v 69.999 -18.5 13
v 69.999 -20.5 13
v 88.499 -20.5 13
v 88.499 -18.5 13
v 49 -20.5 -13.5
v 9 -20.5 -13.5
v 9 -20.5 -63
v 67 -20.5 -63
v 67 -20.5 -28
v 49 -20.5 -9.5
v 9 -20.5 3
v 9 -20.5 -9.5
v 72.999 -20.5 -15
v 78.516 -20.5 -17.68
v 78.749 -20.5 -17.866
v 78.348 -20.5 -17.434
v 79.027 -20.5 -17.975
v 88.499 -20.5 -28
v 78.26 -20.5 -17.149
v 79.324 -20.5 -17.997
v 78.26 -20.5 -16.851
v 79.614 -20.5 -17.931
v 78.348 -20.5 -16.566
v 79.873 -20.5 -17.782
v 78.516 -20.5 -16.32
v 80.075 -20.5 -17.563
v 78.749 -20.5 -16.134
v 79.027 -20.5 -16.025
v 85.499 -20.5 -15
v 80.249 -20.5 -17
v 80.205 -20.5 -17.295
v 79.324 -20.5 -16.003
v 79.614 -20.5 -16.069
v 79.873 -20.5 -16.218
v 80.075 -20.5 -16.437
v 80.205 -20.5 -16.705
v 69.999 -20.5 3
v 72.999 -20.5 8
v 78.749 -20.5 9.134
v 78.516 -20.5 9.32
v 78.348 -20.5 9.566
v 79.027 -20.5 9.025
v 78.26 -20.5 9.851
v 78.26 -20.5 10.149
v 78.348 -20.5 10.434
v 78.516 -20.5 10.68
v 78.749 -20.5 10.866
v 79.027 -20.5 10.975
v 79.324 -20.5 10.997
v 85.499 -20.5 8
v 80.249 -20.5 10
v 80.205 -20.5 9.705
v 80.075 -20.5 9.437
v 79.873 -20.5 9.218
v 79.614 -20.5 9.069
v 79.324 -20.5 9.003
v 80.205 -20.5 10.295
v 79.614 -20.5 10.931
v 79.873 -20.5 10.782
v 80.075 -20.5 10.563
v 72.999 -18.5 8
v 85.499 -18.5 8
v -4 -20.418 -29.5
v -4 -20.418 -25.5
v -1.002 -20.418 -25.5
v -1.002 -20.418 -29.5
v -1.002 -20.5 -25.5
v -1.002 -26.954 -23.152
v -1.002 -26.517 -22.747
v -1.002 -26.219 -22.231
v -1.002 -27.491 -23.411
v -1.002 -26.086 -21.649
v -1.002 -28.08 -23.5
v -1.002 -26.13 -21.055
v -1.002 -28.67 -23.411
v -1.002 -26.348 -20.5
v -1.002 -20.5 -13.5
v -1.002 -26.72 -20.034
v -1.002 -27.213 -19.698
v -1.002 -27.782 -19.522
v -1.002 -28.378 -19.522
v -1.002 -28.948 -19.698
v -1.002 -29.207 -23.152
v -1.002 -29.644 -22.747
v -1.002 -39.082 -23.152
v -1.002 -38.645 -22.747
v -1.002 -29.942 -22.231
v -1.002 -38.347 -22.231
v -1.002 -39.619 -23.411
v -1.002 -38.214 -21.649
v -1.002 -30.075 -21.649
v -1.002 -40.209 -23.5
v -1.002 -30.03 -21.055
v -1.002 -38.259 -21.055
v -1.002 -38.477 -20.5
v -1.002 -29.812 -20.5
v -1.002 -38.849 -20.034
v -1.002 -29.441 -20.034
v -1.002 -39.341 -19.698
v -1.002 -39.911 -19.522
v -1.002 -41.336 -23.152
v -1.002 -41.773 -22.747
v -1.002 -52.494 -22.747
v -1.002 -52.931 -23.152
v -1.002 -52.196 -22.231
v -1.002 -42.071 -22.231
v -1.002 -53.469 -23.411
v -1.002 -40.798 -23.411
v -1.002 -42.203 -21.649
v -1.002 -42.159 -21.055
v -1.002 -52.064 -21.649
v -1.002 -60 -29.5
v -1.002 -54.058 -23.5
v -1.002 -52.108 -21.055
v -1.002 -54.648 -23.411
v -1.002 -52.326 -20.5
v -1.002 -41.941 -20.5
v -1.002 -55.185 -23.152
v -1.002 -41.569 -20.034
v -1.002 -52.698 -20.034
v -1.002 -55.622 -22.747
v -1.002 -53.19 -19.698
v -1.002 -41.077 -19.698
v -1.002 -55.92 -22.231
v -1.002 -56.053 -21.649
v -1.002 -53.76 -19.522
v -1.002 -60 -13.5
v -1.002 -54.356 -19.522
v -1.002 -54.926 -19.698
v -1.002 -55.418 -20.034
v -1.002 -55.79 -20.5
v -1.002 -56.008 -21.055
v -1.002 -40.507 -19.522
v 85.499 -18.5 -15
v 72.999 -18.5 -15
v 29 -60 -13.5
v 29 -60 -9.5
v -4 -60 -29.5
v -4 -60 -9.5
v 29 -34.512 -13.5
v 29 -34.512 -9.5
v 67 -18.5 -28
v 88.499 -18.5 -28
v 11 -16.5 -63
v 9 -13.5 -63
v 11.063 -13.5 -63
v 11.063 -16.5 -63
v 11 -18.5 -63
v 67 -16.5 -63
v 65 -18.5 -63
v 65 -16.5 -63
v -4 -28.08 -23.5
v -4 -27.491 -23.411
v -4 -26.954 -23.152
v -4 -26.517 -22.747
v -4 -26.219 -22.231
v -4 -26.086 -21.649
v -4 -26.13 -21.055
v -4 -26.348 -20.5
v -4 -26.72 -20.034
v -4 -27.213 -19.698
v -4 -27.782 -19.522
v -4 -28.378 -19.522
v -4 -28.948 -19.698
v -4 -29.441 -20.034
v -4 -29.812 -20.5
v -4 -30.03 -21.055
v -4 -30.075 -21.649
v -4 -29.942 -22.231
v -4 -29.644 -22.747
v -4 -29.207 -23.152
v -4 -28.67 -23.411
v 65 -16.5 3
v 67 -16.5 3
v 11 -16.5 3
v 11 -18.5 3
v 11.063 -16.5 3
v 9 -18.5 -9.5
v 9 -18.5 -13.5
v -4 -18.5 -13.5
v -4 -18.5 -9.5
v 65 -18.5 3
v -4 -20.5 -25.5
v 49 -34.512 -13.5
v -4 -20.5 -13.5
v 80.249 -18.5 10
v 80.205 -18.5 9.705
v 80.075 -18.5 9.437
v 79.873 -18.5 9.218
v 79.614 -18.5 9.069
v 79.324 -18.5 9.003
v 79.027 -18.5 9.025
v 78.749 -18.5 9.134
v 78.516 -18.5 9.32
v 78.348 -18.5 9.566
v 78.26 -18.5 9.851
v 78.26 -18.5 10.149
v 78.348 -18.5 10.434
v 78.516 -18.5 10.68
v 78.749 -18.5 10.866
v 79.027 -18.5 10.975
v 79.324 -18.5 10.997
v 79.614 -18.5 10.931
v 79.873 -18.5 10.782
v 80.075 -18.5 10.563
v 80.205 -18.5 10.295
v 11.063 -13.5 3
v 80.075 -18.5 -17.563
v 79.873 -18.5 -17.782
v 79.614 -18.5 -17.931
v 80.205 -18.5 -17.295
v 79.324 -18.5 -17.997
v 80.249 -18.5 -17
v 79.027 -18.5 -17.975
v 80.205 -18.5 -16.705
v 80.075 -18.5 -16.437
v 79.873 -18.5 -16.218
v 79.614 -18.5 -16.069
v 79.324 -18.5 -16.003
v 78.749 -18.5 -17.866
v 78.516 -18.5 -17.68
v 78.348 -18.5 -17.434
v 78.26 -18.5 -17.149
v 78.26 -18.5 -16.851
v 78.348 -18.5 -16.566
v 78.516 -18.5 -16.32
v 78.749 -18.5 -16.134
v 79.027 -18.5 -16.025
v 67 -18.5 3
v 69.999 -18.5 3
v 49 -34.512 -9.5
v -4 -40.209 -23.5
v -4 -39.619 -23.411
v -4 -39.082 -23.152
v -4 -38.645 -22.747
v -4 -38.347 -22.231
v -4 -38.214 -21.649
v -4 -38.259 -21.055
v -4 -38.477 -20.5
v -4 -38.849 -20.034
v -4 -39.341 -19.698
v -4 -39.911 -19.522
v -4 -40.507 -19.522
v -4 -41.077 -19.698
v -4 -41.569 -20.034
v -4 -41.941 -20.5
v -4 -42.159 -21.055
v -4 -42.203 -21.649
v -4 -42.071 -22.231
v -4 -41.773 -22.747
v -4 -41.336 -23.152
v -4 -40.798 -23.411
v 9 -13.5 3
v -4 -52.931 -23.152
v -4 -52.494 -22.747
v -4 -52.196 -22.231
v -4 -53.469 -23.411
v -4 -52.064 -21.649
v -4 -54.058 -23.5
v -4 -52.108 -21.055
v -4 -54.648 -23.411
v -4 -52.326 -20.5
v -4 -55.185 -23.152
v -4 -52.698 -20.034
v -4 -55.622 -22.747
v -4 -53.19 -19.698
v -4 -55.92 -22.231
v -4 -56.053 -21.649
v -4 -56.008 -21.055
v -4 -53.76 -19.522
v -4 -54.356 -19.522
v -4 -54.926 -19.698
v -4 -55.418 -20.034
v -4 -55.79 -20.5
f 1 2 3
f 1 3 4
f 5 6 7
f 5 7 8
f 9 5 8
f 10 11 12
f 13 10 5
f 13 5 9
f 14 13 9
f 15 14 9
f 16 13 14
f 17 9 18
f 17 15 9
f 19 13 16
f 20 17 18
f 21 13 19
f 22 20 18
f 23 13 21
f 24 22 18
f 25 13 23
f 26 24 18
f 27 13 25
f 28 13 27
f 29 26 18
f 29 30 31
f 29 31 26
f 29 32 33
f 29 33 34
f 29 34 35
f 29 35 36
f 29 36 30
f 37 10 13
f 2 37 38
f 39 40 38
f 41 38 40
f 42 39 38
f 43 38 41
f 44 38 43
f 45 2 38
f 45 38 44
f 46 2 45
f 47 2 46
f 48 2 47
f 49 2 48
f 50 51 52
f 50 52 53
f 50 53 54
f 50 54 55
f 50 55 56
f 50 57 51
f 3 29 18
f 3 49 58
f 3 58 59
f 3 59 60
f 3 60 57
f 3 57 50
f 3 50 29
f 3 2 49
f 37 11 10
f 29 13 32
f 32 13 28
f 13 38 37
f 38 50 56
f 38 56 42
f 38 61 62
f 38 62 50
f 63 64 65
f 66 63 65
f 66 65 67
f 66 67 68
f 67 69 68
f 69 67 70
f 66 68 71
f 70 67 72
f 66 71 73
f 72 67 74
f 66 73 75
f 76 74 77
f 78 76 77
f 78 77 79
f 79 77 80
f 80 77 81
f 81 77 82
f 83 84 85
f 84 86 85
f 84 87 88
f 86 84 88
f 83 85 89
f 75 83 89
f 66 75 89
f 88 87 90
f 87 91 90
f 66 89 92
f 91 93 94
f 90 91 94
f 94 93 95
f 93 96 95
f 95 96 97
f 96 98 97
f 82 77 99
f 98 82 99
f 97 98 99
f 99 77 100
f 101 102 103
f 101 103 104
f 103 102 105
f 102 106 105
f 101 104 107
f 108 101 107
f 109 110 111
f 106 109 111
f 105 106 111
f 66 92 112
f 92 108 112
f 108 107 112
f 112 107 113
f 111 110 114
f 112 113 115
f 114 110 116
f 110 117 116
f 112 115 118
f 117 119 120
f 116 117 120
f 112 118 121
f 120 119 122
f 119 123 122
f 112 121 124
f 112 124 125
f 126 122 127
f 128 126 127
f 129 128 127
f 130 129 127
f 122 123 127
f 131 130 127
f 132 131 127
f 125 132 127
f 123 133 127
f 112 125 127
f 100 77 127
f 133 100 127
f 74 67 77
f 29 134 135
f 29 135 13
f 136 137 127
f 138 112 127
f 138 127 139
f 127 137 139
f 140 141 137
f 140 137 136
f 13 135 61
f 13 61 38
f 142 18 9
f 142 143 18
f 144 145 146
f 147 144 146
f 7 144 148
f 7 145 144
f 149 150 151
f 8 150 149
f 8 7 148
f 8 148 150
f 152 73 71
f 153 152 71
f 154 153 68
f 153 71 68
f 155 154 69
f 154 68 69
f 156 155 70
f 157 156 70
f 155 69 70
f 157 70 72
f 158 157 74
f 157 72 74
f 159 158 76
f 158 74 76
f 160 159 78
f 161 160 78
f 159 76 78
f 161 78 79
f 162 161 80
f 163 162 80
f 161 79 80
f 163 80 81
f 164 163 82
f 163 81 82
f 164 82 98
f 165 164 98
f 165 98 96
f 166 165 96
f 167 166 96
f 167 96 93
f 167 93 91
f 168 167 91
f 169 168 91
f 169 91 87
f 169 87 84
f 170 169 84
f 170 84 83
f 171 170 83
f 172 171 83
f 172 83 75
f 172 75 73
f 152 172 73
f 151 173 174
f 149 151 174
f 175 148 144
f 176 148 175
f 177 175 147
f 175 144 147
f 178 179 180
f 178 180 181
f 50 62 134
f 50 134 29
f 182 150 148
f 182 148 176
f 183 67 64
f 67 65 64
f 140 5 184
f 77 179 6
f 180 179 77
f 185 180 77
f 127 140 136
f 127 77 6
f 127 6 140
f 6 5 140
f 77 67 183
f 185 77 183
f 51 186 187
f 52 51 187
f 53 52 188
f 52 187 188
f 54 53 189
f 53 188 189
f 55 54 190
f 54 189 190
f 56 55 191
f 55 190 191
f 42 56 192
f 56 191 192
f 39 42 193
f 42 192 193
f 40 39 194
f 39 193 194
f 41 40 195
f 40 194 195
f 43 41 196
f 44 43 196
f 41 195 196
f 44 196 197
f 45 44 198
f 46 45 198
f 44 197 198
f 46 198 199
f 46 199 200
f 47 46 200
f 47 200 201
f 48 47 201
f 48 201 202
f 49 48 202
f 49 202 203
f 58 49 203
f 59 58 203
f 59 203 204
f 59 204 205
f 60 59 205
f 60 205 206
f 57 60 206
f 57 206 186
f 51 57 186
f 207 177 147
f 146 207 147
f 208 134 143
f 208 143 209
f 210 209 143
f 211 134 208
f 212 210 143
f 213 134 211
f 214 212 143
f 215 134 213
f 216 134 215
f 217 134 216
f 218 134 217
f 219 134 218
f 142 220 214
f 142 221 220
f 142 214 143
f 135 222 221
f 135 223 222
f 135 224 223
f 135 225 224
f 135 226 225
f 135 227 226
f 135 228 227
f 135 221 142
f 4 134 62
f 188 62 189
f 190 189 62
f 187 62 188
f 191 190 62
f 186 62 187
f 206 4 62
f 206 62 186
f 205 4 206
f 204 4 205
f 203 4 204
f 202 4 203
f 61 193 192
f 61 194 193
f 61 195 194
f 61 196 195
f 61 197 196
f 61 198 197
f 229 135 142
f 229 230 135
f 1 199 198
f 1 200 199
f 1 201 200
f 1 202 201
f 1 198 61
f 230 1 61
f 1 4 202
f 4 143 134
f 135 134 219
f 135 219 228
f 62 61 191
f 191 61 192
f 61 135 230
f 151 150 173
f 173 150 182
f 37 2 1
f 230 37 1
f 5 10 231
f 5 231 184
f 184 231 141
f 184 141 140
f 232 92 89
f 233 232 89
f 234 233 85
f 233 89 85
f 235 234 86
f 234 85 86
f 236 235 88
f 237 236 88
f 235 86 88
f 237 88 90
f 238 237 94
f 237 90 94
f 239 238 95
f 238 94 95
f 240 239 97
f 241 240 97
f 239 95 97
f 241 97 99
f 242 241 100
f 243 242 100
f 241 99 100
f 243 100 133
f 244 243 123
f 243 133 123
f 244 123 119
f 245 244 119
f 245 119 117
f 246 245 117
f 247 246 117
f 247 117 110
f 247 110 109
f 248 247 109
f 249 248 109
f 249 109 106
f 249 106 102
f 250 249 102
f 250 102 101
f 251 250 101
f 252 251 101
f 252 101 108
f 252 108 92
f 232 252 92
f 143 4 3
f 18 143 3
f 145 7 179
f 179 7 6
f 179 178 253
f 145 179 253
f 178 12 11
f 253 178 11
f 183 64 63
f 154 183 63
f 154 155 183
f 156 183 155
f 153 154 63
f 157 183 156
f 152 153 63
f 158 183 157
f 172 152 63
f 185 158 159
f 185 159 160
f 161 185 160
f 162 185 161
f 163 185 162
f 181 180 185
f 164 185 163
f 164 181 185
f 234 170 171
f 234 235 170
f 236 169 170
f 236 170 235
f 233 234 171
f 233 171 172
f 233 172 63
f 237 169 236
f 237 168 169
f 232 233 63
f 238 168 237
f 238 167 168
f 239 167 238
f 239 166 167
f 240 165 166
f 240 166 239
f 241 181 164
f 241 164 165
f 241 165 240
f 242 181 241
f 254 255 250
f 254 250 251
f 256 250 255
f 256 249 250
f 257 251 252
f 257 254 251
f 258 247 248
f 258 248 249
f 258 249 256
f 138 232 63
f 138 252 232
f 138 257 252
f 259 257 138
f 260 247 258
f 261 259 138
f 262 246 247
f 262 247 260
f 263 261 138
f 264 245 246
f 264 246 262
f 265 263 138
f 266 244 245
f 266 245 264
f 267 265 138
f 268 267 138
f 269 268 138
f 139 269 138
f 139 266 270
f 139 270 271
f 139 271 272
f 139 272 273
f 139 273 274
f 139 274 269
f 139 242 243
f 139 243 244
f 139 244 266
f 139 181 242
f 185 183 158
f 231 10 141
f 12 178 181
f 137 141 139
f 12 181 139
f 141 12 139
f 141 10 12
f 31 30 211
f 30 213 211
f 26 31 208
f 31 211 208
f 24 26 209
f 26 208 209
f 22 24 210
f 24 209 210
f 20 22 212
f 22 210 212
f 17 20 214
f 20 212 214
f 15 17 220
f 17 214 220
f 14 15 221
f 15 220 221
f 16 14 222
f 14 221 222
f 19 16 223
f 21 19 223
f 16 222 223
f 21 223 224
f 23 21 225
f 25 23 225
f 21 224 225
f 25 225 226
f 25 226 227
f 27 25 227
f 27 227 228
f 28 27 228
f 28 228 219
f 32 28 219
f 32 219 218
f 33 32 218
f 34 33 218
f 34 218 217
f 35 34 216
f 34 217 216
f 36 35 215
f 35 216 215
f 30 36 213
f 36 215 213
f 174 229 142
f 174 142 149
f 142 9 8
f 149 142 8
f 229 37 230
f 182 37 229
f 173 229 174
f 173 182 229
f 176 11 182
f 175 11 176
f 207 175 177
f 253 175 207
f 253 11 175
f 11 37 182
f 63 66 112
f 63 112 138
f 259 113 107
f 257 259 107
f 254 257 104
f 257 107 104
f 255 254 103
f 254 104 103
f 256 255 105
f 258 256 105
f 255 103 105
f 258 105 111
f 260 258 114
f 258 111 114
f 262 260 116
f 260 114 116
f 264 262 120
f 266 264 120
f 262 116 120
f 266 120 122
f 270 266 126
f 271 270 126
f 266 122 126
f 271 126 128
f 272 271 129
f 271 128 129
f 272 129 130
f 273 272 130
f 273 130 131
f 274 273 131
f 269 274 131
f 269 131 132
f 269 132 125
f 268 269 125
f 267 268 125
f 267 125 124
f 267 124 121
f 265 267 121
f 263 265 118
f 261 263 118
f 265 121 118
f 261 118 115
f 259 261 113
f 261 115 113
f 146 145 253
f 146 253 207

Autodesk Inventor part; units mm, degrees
ref_plane "YZ Plane" through (0, 0, 0) normal (1, 0, 0) x (0, 1, 0)
ref_plane "XZ Plane" through (0, 0, 0) normal (0, 1, 0) x (-1, 0, 0)
ref_plane "XY Plane" through (0, 0, 0) normal (0, 0, 1) x (1, 0, 0)
sketch "Sketch1" plane through (0, 0, 0) normal (1, 0, 0) x (0, 1, 0)
  line L0 (0, 0) -> (20.5296, 0)
  line L1 (20.5296, -23) -> (0, -23)
  line L2 (0, -23) -> (0, 0)
  line L3 (0, 0) -> (50, 0)
  line L4 (50, 0) -> (50, -23)
  line L5 (50, -23) -> (0, -23)
  line L6 (0, -23) -> (0, 0)
  dimension "d0" = 23
  dimension "d1" = 50
extrude "Extrusion1" add sketch "Sketch1" along normal blind 2
sketch "Sketch2" plane through (2, 0, 0) normal (1, 0, 0) x (0, 0, -1)
  line L0 (23, 50) -> (0, 50) projected
  line L1 (13.5, 0) -> (9.5, 0)
  line L2 (9.5, 0) -> (9.5, 50)
  line L3 (9.5, 50) -> (13.5, 50)
  line L4 (13.5, 50) -> (13.5, 0)
  line L5 (13.5, 0) -> (9.5, 50) construction
  line L6 (9.5, 0) -> (13.5, 50) construction
  point P0 (0, 0)
  point P1 (17.2504, 25)
  point P2 (11.5, 25)
  dimension "d4" = 4
sketch "Sketch3" plane through (0, 0, 0) normal (-1, 0, 0) x (0, 0, 1)
  line L0 (-23, 50) -> (0, 50) projected
  line L1 (-23, 50) -> (0, 50)
  line L2 (0, 50) -> (0, 0)
  line L3 (0, 0) -> (-23, 0)
  line L4 (-23, 0) -> (-23, 50)
extrude "Extrusion2" add sketch "Sketch3" along normal blind 1
sketch "Sketch4" plane through (2, 0, 0) normal (1, 0, 0) x (0, 0, -1)
  point P0 (0, 0)
extrude "Extrusion3" add sketch "Sketch2" along normal blind 29
sketch "Sketch5" plane through (2, 0, -9.5) normal (0, 0, 1) x (1, 0, 0)
  line L0 (0, 50) -> (29, 50) projected
  line L1 (29, 0) -> (27, 0)
  line L2 (27, 0) -> (27, 50)
  line L3 (27, 50) -> (29, 50)
  line L4 (29, 50) -> (29, 0)
  point P0 (-2, 0)
  dimension "d9" = 2
extrude "Extrusion4" add sketch "Sketch5" along normal blind 17.5
sketch "Sketch6" plane through (2, 0, -13.5) normal (0, 0, -1) x (-1, 0, 0)
  line L0 (-29, 50) -> (-27, 50) projected
  line L1 (-27, 50) -> (-27, 0) projected
  line L2 (-29, 50) -> (-27, 50)
  line L3 (-27, 50) -> (-27, 0)
  line L4 (-27, 0) -> (-29, 0)
  line L5 (-29, 0) -> (-29, 50)
  point P0 (2, 0)
extrude "Extrusion5" add sketch "Sketch6" along normal blind 17.5
sketch "Sketch7" plane through (31, 0, 0) normal (1, 0, 0) x (0, 0, -1)
  line L0 (-8, 0) -> (-8, 50) projected
  line L1 (31, 50) -> (31, 0) projected
  line L2 (-8, 50) -> (31, 50)
  line L3 (31, 50) -> (31, 48)
  line L4 (31, 48) -> (-8, 48)
  line L5 (-8, 48) -> (-8, 50)
  point P0 (0, 0)
  dimension "d14" = 2
extrude "Extrusion6" add sketch "Sketch7" along normal blind 32
sketch "Sketch8" plane through (31, 48, -31) normal (0, -1, 0) x (1, 0, 0)
  line L0 (32, 39) -> (32, 0) projected
  line L1 (0, 0) -> (32, 0) projected
  line L2 (32, 39) -> (30, 39)
  line L3 (30, 39) -> (30, 0)
  line L4 (30, 0) -> (32, 0)
  line L5 (32, 0) -> (32, 39)
  point P0 (-31, 31)
  dimension "d17" = 2
extrude "Extrusion7" add sketch "Sketch8" along normal up to surface (48 mm away)
sketch "Sketch9" plane through (31, 48, -31) normal (0, -1, 0) x (1, 0, 0)
  point P0 (-31, 31)
sketch "Sketch10" plane through (61, 0, 8) normal (0, -1, 0) x (1, 0, 0)
  line L0 (2, -39) -> (2, 0) projected
  line L1 (-32, -17.5) -> (-32, 0) projected
  line L2 (2, 0) -> (-32, 0)
  line L3 (-32, 0) -> (-32, -9)
  line L4 (-32, -9) -> (2, -9)
  line L5 (2, -9) -> (2, 0)
  point P0 (-61, -8)
  dimension "d20" = 9
extrude "Extrusion8" cut sketch "Sketch10" against normal blind 50
sketch "Sketch11" plane through (2, 0, -31) normal (0, 0, -1) x (-1, 0, 0)
  line L0 (-61, 50) -> (-61, 0) projected
  line L1 (0, 50) -> (-27, 50) projected
  line L2 (-61, 0) -> (-27, 0)
  line L3 (-27, 0) -> (-27, 50)
  line L4 (-27, 50) -> (-61, 50)
  line L5 (-61, 50) -> (-61, 0)
  point P0 (2, 0)
extrude "Extrusion9" add sketch "Sketch11" along normal blind 2
sketch "Sketch12" plane through (-1, 0, 0) normal (0, -1, 0) x (1, 0, 0)
  line L0 (62, -1) -> (32, -1) projected
  line L1 (64, -1) -> (64, -33) projected
  line L2 (62, -1) -> (64, -1)
  line L3 (64, -1) -> (64, -31.0308)
  line L4 (64, -31.0308) -> (62, -31.0308)
  line L5 (62, -31.0308) -> (62, -1)
  point P0 (1, 0)
extrude "Extrusion10" add sketch "Sketch12" along normal blind 20.5
sketch "Sketch13" plane through (61, 48, -31) normal (-1, 0, 0) x (0, 0, 1)
  line L0 (30, -68.5) -> (-0.0308, -68.5) projected
  line L1 (30, 0) -> (30, -68.5) projected
  line L2 (-0.0308, -68.5) -> (30, -68.5)
  line L3 (30, -68.5) -> (30, -66.5)
  line L4 (30, -66.5) -> (-0.0308, -66.5)
  line L5 (-0.0308, -66.5) -> (-0.0308, -68.5)
  point P0 (31, -48)
  dimension "d27" = 2
extrude "Extrusion11" add sketch "Sketch13" along normal up to surface (32 mm away)
sketch "Sketch14" plane through (-1, 0, 0) normal (0, -1, 0) x (1, 0, 0)
  line L0 (64, -33) -> (30, -33) projected
  line L1 (64, -31.0308) -> (30, -31.0308) projected
  line L2 (64, -33) -> (30, -33)
  line L3 (30, -33) -> (30, -31.0308)
  line L4 (30, -31.0308) -> (64, -31.0308)
  line L5 (64, -31.0308) -> (64, -33)
  point P0 (1, 0)
  point P1 (30, -33)
extrude "Extrusion12" add sketch "Sketch14" along normal up to surface (20.5 mm away)
sketch "Sketch15" plane through (61, 48, -31) normal (-1, 0, 0) x (0, 0, 1)
  line L0 (-0.0308, -66.5) -> (30, -66.5) projected
  line L1 (30, 0) -> (30, -66.5) projected
  line L2 (-0.0308, -66.5) -> (30, -66.5)
  line L3 (30, -66.5) -> (30, -48)
  line L4 (30, -48) -> (-0.0308, -48)
  line L5 (-0.0308, -48) -> (-0.0308, -66.5)
  point P0 (31, -48)
extrude "Extrusion13" cut sketch "Sketch15" against normal blind 10
sketch "Sketch16" plane through (-1, 0, 0) normal (0, -1, 0) x (1, 0, 0)
  line L0 (32, -31) -> (32, -1) projected
  line L1 (30, -33) -> (64, -33) projected
  line L2 (32, -1) -> (30, -1)
  line L3 (30, -1) -> (30, -33)
  line L4 (30, -33) -> (32, -33)
  line L5 (32, -33) -> (32, -1)
  point P0 (1, 0)
extrude "Extrusion14" add sketch "Sketch16" along normal up to surface (18.5 mm away)
sketch "Sketch17" plane through (31, 0, -31.0308) normal (0, 0, 1) x (1, 0, 0)
  line L0 (0, 48) -> (0, -18.5) projected
  line L1 (32, 50) -> (32, -20.5) projected
  line L2 (0, -18.5) -> (32, -18.5)
  line L3 (32, -18.5) -> (32, 0)
  line L4 (32, 0) -> (0, 0)
  line L5 (0, 0) -> (0, -18.5)
  point P0 (-31, 0)
extrude "Extrusion15" cut sketch "Sketch17" against normal blind 10
sketch "Sketch18" plane through (31, 0, 0) normal (1, 0, 0) x (0, 0, -1)
  line L0 (1, 48) -> (1, -18.5) projected
  line L1 (31, 0) -> (1, 0) projected
  line L2 (1, -18.5) -> (3, -18.5)
  line L3 (3, -18.5) -> (3, 0)
  line L4 (3, 0) -> (1, 0)
  line L5 (1, 0) -> (1, -18.5)
  point P0 (0, 0)
  dimension "d38" = 2
extrude "Extrusion16" add sketch "Sketch18" along normal blind 13
sketch "Sketch19" plane through (29, 50, -1) normal (0, 0, 1) x (1, 0, 0)
  line L0 (34, -68.5) -> (34, -70.5) projected
  line L1 (34, -70.5) -> (0, -70.5) projected
  line L2 (34, -68.5) -> (0, -68.5)
  line L3 (0, -68.5) -> (0, -70.5)
  line L4 (0, -70.5) -> (34, -70.5)
  line L5 (34, -70.5) -> (34, -68.5)
  point P0 (-29, -50)
extrude "Extrusion17" add sketch "Sketch19" along normal blind 2
sketch "Sketch20" plane through (31, -18.5, -33) normal (0, 1, 0) x (1, 0, 0)
  point P0 (-31, -33)
sketch "Sketch21" plane through (29, 50, -1) normal (0, 0, 1) x (1, 0, 0)
  line L0 (15, -50) -> (15, -68.5) projected
  line L1 (2, -68.5) -> (15, -68.5) projected
  line L2 (15, -50) -> (2, -50)
  line L3 (2, -50) -> (2, -68.5)
  line L4 (2, -68.5) -> (15, -68.5)
  line L5 (15, -68.5) -> (15, -50)
  point P0 (-29, -50)
extrude "Extrusion18" cut sketch "Sketch21" against normal blind 2
sketch "Sketch22" plane through (31, -18.5, -33) normal (0, 1, 0) x (1, 0, 0)
  line L0 (32, -34) -> (-2, -34) projected
  line L1 (30, -32) -> (0, -32) projected
  line L2 (-2, -34) -> (13, -34)
  line L3 (13, -34) -> (13, -32)
  line L4 (13, -32) -> (-2, -32)
  line L5 (-2, -32) -> (-2, -34)
  point P0 (-31, -33)
  dimension "d45" = 15
extrude "Extrusion19" add sketch "Sketch22" along normal blind 4
sketch "Sketch23" plane through (29, 50, 1) normal (0, 0, 1) x (1, 0, 0)
  point P0 (-29, -50)
sketch "Sketch24" plane through (63, 0, 0) normal (1, 0, 0) x (0, 0, -1)
  point P0 (0, 0)
sketch "Sketch25" plane through (63, 0, 0) normal (1, 0, 0) x (0, 0, -1)
  line L0 (-1, -20.5) -> (-1, -18.5) projected
  line L1 (33, -20.5) -> (-1, -20.5) projected
  line L2 (-1, -18.5) -> (33, -18.5)
  line L3 (33, -18.5) -> (33, -20.5)
  line L4 (33, -20.5) -> (-1, -20.5)
  line L5 (-1, -20.5) -> (-1, -18.5)
  point P0 (0, 0)
extrude "Extrusion20" add sketch "Sketch25" along normal blind 5
sketch "Sketch26" plane through (68, 0, 0) normal (1, 0, 0) x (0, 0, -1)
  line L0 (1, -18.5) -> (33, -18.5) projected
  line L1 (33, -20.5) -> (-1, -20.5) projected
  line L2 (2.0812, -18.5) -> (-1, -18.5)
  line L3 (-1, -18.5) -> (-1, -20.5)
  line L4 (-1, -20.5) -> (2.0812, -20.5)
  line L5 (2.0812, -20.5) -> (2.0812, -18.5)
  point P0 (0, 0)
extrude "Extrusion21" add sketch "Sketch26" along normal blind 14
sketch "Sketch27" plane through (68, -20.5, -2.0812) normal (0, 0, -1) x (-1, 0, 0)
  line L0 (-14, 2) -> (-14, 0) projected
  line L1 (39, 0) -> (-14, 0) projected
  line L2 (-14, 2) -> (-12, 2)
  line L3 (-12, 2) -> (-12, 0)
  line L4 (-12, 0) -> (-14, 0)
  line L5 (-14, 0) -> (-14, 2)
  point P0 (68, 20.5)
  dimension "d52" = 2
extrude "Extrusion22" add sketch "Sketch27" along normal blind 25
sketch "Sketch28" plane through (80, -20.5, -2.0812) normal (-1, 0, 0) x (0, 0, 1)
  point P0 (2.0812, 20.5)
sketch "Sketch29" plane through (80, -20.5, -2.0812) normal (-1, 0, 0) x (0, 0, 1)
  line L0 (-25, 2) -> (-25, 0) projected
  line L1 (3.0812, 0) -> (-25, 0) projected
  line L2 (-25, 2) -> (-23, 2)
  line L3 (-23, 2) -> (-23, 0)
  line L4 (-23, 0) -> (-25, 0)
  line L5 (-25, 0) -> (-25, 2)
  point P0 (2.0812, 20.5)
  dimension "d55" = 2
extrude "Extrusion23" add sketch "Sketch29" along normal up to surface (12 mm away)
sketch "Sketch30" plane through (68, -20.5, -27.0812) normal (0, 0, -1) x (-1, 0, 0)
  line L0 (-14, 2) -> (-14, 0) projected
  line L1 (0, 0) -> (-12, 0) projected
  line L2 (-14, 2) -> (0, 2)
  line L3 (0, 2) -> (0, 0)
  line L4 (0, 0) -> (-14, 0)
  line L5 (-14, 0) -> (-14, 2)
  point P0 (68, 20.5)
extrude "Extrusion24" add sketch "Sketch30" along normal up to surface (5.9188 mm away)
sketch "Sketch31" plane through (31, -18.5, -1) normal (0, 1, 0) x (1, 0, 0)
  line L0 (37, 1.0812) -> (49, 1.0812) projected
  line L1 (43, 1.0812) -> (43, 0.2954)
  point P0 (-31, -1)
sketch "Sketch32" plane through (29, 50, 1) normal (0, 0, 1) x (1, 0, 0)
  line L0 (53, -68.5) -> (53, -70.5) projected
  line L1 (15, -68.5) -> (53, -68.5) projected
  line L2 (53, -70.5) -> (15, -70.5)
  line L3 (15, -70.5) -> (15, -68.5)
  line L4 (15, -68.5) -> (53, -68.5)
  line L5 (53, -68.5) -> (53, -70.5)
  point P0 (-29, -50)
extrude "Extrusion25" add sketch "Sketch32" along normal blind 2
sketch "Sketch33" plane through (31, -18.5, -1) normal (0, 1, 0) x (1, 0, 0)
  line L0 (37, 1.0812) -> (49, 1.0812) projected
  circle A0 centre (43, -0.9188) radius 1
  line L1 (49, 24.0812) -> (37, 24.0812) projected
  circle A1 centre (43, 26.0812) radius 1
  point P0 (-31, -1)
  dimension "d63" = 2
extrude "Extrusion26" cut sketch "Sketch33" against normal blind 5
thread "Thread1" size "M2x0.4" class "6H" standard "ANSI Metric M Profile" full length
thread "Thread2" size "M2x0.4" class "6H" standard "ANSI Metric M Profile" full length
sketch "Sketch34" plane through (2, 0, -33) normal (0, 0, -1) x (-1, 0, 0)
  line L0 (-27, 50) -> (-27, -20.5) projected
  line L1 (-80, -18.5) -> (-42, -18.5) projected
  line L2 (-27, -20.5) -> (-61, -20.5)
  line L3 (-61, -20.5) -> (-61, -18.5)
  line L4 (-61, -18.5) -> (-27, -18.5)
  line L5 (-27, -18.5) -> (-27, -20.5)
  point P0 (2, 0)
  point P1 (-42, -18.5)
extrude "Extrusion27" add sketch "Sketch34" along normal blind 30
sketch "Sketch35" plane through (31, -18.5, -1) normal (0, 1, 0) x (1, 0, 0)
  line L0 (0, 0) -> (0, 32) projected
  line L1 (-2, 62) -> (-2, -2) projected
  line L2 (0, 32) -> (-2, 32)
  line L3 (-2, 32) -> (-2, 62)
  line L4 (-2, 62) -> (0, 62)
  line L5 (0, 62) -> (0, 32)
  point P0 (-31, -1)
extrude "Extrusion28" add sketch "Sketch35" along normal blind 2
sketch "Sketch36" plane through (63, -20.5, -33) normal (1, 0, 0) x (0, 0, -1)
  line L0 (0, 0) -> (0, 2) projected
  line L1 (0, 2) -> (30, 2)
  line L2 (30, 2) -> (30, 0)
  line L3 (30, 0) -> (0, 0)
  line L4 (0, 0) -> (0, 2)
  point P0 (-33, 20.5)
extrude "Extrusion29" add sketch "Sketch36" along normal blind 4
sketch "Sketch37" plane through (31, -18.5, -1) normal (0, 1, 0) x (1, 0, 0)
  line L0 (0, 62) -> (36, 62) projected
  line L1 (51, -4) -> (13, -4) projected
  line L2 (36, 62) -> (34, 62)
  line L3 (34, 62) -> (34, -4)
  line L4 (34, -4) -> (36, -4)
  line L5 (36, -4) -> (36, 62)
  point P0 (-31, -1)
  dimension "d77" = 2
extrude "Extrusion30" add sketch "Sketch37" along normal blind 2
sketch "Sketch38" plane through (29, 50, -1) normal (0, 0, 1) x (1, 0, 0)
  line L0 (2, -2) -> (2, -64.5) projected
  line L1 (0, 0) -> (0, -66.5) projected
  line L2 (2, -2) -> (0, -2)
  line L3 (0, -2) -> (0, -20)
  line L4 (0, -20) -> (2, -20)
  line L5 (2, -20) -> (2, -2)
  line L6 (34, -50) -> (2, -50) projected
  line L7 (0, -20) -> (34, -20)
  line L8 (34, -20) -> (34, -50)
  line L9 (34, -50) -> (0, -50)
  line L10 (0, -50) -> (0, -20)
  point P0 (-29, -50)
  dimension "d80" = 18
extrude "Extrusion31" add sketch "Sketch38" along normal blind 2 contours L7 L8 L6 L0
sketch "Sketch39" plane through (29, 50, -1) normal (0, 0, 1) x (1, 0, 0)
  line L0 (-27, -50) -> (0, -50) projected
  line L1 (2, -20) -> (2, -50) projected
  line L2 (0, -50) -> (2, -50)
  line L3 (2, -50) -> (2, -20)
  line L4 (2, -20) -> (0, -20)
  line L5 (0, -20) -> (0, -50)
  point P0 (-29, -50)
extrude "Extrusion32" add sketch "Sketch39" along normal blind 2
sketch "Sketch40" plane through (29, 50, 1) normal (0, 0, 1) x (1, 0, 0)
  line L0 (34, -50) -> (34, -20) projected
  line L1 (0, -20) -> (34, -20)
  line L2 (34, -20) -> (34, -20.389)
  line L3 (34, -20.389) -> (0, -20.389)
  line L4 (0, -20.389) -> (0, -20)
  point P0 (-29, -50)
  dimension "d85" = 0.389
extrude "Extrusion33" cut sketch "Sketch40" against normal blind 2
sketch "Sketch41" plane through (29, 50, 1) normal (0, 0, 1) x (1, 0, 0)
  point P0 (-29, -50)
sketch "Sketch42" plane through (29, 50, -1) normal (0, 0, 1) x (1, 0, 0)
  line L0 (32, -2) -> (32, -20.389) projected
  line L1 (32, -2) -> (38, -2)
  point P0 (-29, -50)
  dimension "d88" = 6
sketch "Sketch43" plane through (63, 0, 0) normal (1, 0, 0) x (0, 0, -1)
  line L0 (9.5, 50) -> (1, 50) projected
  line L1 (31, 48) -> (1, 48) projected
  line L2 (1, 50) -> (31, 50)
  line L3 (31, 50) -> (31, 48)
  line L4 (31, 48) -> (1, 48)
  line L5 (1, 48) -> (1, 50)
  point P0 (0, 0)
  point P1 (1, 48)
extrude "Extrusion34" add sketch "Sketch43" along normal blind 6
sketch "Sketch44" plane through (63, 0, 0) normal (1, 0, 0) x (0, 0, -1)
  line L0 (33, 50) -> (33, 0) projected
  line L1 (31, 0) -> (33, 0) projected
  line L2 (33, 50) -> (31, 50)
  line L3 (31, 50) -> (31, 0)
  line L4 (31, 0) -> (33, 0)
  line L5 (33, 0) -> (33, 50)
  point P0 (0, 0)
extrude "Extrusion35" add sketch "Sketch44" along normal blind 6
sketch "Sketch45" plane through (63, 0, 0) normal (1, 0, 0) x (0, 0, -1)
  point P0 (0, 0)
sketch "Sketch46" plane through (63, 0, 0) normal (1, 0, 0) x (0, 0, -1)
  line L0 (-1, 0) -> (-1, 29.611) projected
  line L1 (31, 0) -> (31, 48) projected
  line L2 (-1, 0) -> (31, 0)
  line L3 (31, 0) -> (31, 2)
  line L4 (31, 2) -> (-1, 2)
  line L5 (-1, 2) -> (-1, 0)
  point P0 (0, 0)
  point P1 (-1, 2)
  dimension "d93" = 2
extrude "Extrusion36" add sketch "Sketch46" along normal blind 6
sketch "Sketch47" plane through (63, 48, -31) normal (0, 0, 1) x (1, 0, 0)
  line L0 (0, 0) -> (6, 0) projected
  line L1 (0, -46) -> (6, -46) projected
  line L2 (6, 0) -> (4, 0)
  line L3 (4, 0) -> (4, -46)
  line L4 (4, -46) -> (6, -46)
  line L5 (6, -46) -> (6, 0)
  point P0 (-63, -48)
  point P1 (4, 0)
  dimension "d96" = 2
sketch "Sketch48" plane through (63, 0, 0) normal (1, 0, 0) x (0, 0, -1)
  line L0 (31, 48) -> (1, 48) projected
  line L1 (1, 48) -> (31, 48)
  line L2 (31, 48) -> (31, 2)
  line L3 (31, 2) -> (1, 2)
  line L4 (1, 2) -> (1, 48)
  point P0 (0, 0)
extrude "Extrusion37" cut sketch "Sketch48" against normal blind 10
extrude "Extrusion38" add sketch "Sketch47" along normal up to surface (30 mm away)
sketch "Sketch49" plane through (63, 0, 0) normal (1, 0, 0) x (0, 0, -1)
  line L0 (1, 2) -> (1, 0) projected
  line L1 (-1, 29.611) -> (1, 29.611)
  line L2 (1, 29.611) -> (1, 2)
  line L3 (1, 2) -> (-1, 2)
  line L4 (-1, 2) -> (-1, 29.611)
  point P0 (0, 0)
extrude "Extrusion39" add sketch "Sketch49" along normal up to surface (6 mm away)
sketch "Sketch50" plane through (31, 0, -31) normal (0, -1, 0) x (1, 0, 0)
  line L0 (0, 30) -> (30, 30) projected
  line L1 (36, 30) -> (36, 0) projected
  line L2 (30, 30) -> (36, 30)
  line L3 (36, 30) -> (36, 0)
  line L4 (36, 0) -> (30, 0)
  line L5 (30, 0) -> (30, 30)
  point P0 (-31, 31)
extrude "Extrusion40" cut sketch "Sketch50" against normal blind 10
sketch "Sketch51" plane through (-1, 0, 0) normal (-1, 0, 0) x (0, 0, 1)
  line L0 (-23, 0) -> (-23, 50) projected
  line L1 (-23, 0) -> (0, 0)
  line L2 (0, 0) -> (0, 50)
  line L3 (0, 50) -> (-23, 50)
  line L4 (-23, 50) -> (-23, 0)
extrude "Extrusion41" cut sketch "Sketch51" against normal blind 3
sketch "Sketch52" plane through (29, 0, -9.5) normal (0, 0, 1) x (1, 0, 0)
  point P0 (-29, 0)
sketch "Sketch53" plane through (2, 0, 0) normal (-1, 0, 0) x (0, 0, 1)
  line L0 (-13.5, 50) -> (-13.5, 0) projected
  line L1 (-9.5, 0) -> (-9.5, 50) projected
  line L2 (-13.5, 50) -> (-9.5, 50)
  line L3 (-9.5, 50) -> (-9.5, 0)
  line L4 (-9.5, 0) -> (-13.5, 0)
  line L5 (-13.5, 0) -> (-13.5, 50)
  point P0 (0, 0)
extrude "Extrusion42" add sketch "Sketch53" along normal blind 6
sketch "Sketch54" plane through (29, 0, -9.5) normal (0, 0, 1) x (1, 0, 0)
  line L0 (0, 50) -> (-33, 50) projected
  line L1 (-33, 0) -> (0, 0) projected
  line L2 (-33, 50) -> (-30, 50)
  line L3 (-30, 50) -> (-30, 0)
  line L4 (-30, 0) -> (-33, 0)
  line L5 (-33, 0) -> (-33, 50)
  point P0 (-29, 0)
  dimension "d109" = 3
sketch "Sketch55" plane through (29, 0, -13.5) normal (0, 0, -1) x (-1, 0, 0)
  line L0 (33, 50) -> (33, 0) projected
  line L1 (33, 0) -> (0, 0) projected
  line L2 (33, 50) -> (30, 50)
  line L3 (30, 50) -> (30, 0)
  line L4 (30, 0) -> (33, 0)
  line L5 (33, 0) -> (33, 50)
  point P0 (29, 0)
  dimension "d110" = 3
extrude "Extrusion43" add sketch "Sketch55" along normal blind 12
sketch "Sketch56" plane through (29, 0, -13.5) normal (0, -1, 0) x (1, 0, 0)
  line L0 (-33, 4) -> (-33, -12) projected
  line L1 (0, 4) -> (-33, 4) projected
  line L2 (-33, -12) -> (-30.0022, -12)
  line L3 (-30.0022, -12) -> (-30.0022, 4)
  line L4 (-30.0022, 4) -> (-33, 4)
  line L5 (-33, 4) -> (-33, -12)
  line L6 (-30, 0) -> (0, 0) projected
  line L7 (-30.0022, 4) -> (0, 4)
  line L8 (0, 4) -> (0, 0)
  line L9 (0, 0) -> (-30.0022, 0)
  line L10 (-30.0022, 0) -> (-30.0022, 4)
  point P0 (-29, 13.5)
extrude "Extrusion44" add sketch "Sketch56" along normal blind 60
sketch "Sketch57" plane through (29, 50, 1) normal (0, 0, 1) x (1, 0, 0)
  point P0 (-29, -50)
sketch "Sketch58" plane through (-4, 0, 0) normal (-1, 0, 0) x (0, 0, 1)
  point P0 (0, 0)
sketch "Sketch59" plane through (-4, 0, 0) normal (-1, 0, 0) x (0, 0, 1)
  point P0 (0, 0)
extrude "Extrusion45" cut sketch "Sketch54" against normal blind 50
sketch "Sketch60" plane through (-1, 0, -9.5) normal (-1, 0, 0) x (0, 0, 1)
  line L0 (-4, 0) -> (-4, 50) projected
  line L1 (0, 0) -> (0, -60) projected
  line L2 (-4, 50) -> (0, 50)
  line L3 (0, 50) -> (0, 0)
  line L4 (0, 0) -> (-4, 0)
  line L5 (-4, 0) -> (-4, 50)
  point P0 (9.5, 0)
extrude "Extrusion46" cut sketch "Sketch60" against normal up to surface (30 mm away)
sketch "Sketch61" plane through (29, -60, -9.5) normal (1, 0, 0) x (0, 0, -1)
  point P0 (-9.5, 60)
sketch "Sketch62" plane through (-4, 0, 0) normal (-1, 0, 0) x (0, 0, 1)
  line L0 (-63, -20.5) -> (-13.5, -20.5) projected
  line L1 (-13.5, 0) -> (-25.5, 0) projected
  line L2 (-25.4638, -20.5) -> (-13.5, -20.5)
  line L3 (-13.5, -20.5) -> (-13.5, 0)
  line L4 (-13.5, 0) -> (-25.4638, 0)
  line L5 (-25.4638, 0) -> (-25.4638, -20.5)
  point P0 (0, 0)
  point P1 (-13.5, -20.5)
extrude "Extrusion47" cut sketch "Sketch62" against normal blind 10
sketch "Sketch63" plane through (29, 0, -25.5) normal (0, 0, -1) x (-1, 0, 0)
  line L0 (33, 0) -> (30.0022, 0) projected
  line L1 (30.0022, 0) -> (30.0022, -20.5) projected
  line L2 (33, 0) -> (30.0022, 0)
  line L3 (30.0022, 0) -> (30.0022, -20.5)
  line L4 (30.0022, -20.5) -> (33, -20.5)
  line L5 (33, -20.5) -> (33, 0)
  point P0 (29, 0)
extrude "Extrusion48" cut sketch "Sketch63" against normal blind 2
sketch "Sketch64" plane through (29, 0, -25.5) normal (0, 0, -1) x (-1, 0, 0)
  line L0 (30.0022, -20.5) -> (30.0022, -60) projected
  line L1 (33, 0) -> (33, -60) projected
  line L2 (30.0022, -60) -> (33, -60)
  line L3 (33, -60) -> (33, -20.4178)
  line L4 (33, -20.4178) -> (30.0022, -20.4178)
  line L5 (30.0022, -20.4178) -> (30.0022, -60)
  point P0 (29, 0)
extrude "Extrusion49" add sketch "Sketch64" along normal blind 4
sketch "Sketch65" plane through (-1.0022, -60, -13.5) normal (1, 0, 0) x (0, 0, -1)
  point P0 (-13.5, 60)
sketch "Sketch66" plane through (-1.0022, -60, -13.5) normal (1, 0, 0) x (0, 0, -1)
  line L0 (16, 0) -> (16, 39.5822) projected
  line L1 (16, 19.7911) -> (8, 19.7911)
  circle A0 centre (8, 19.7911) radius 2
  circle A1 centre (8, 31.9197) radius 2
  circle A2 centre (8, 5.9419) radius 2
  point P0 (-13.5, 60)
  dimension "d125" = 8
  dimension "d126" = 4
  dimension "d127" = 4
  dimension "d128" = 4
extrude "Extrusion50" cut sketch "Sketch66" against normal blind 4
sketch "Sketch67" plane through (69, 0, 0) normal (1, 0, 0) x (0, 0, -1)
  line L0 (1, 0) -> (-1, 0) projected
  line L1 (-1, 0) -> (33, 0)
  line L2 (33, 0) -> (33, 52.0409)
  line L3 (33, 52.0409) -> (-1, 52.0409)
  line L4 (-1, 52.0409) -> (-1, 0)
  point P0 (0, 0)
extrude "Extrusion51" cut sketch "Sketch67" against normal up to surface (40 mm away)
sketch "Sketch68" plane through (29, -60, -9.5) normal (1, 0, 0) x (0, 0, -1)
  line L0 (0, 60) -> (0, 0) projected
  line L1 (4, 39.5) -> (4, 0) projected
  line L2 (0, 25.4882) -> (4, 25.4882)
  line L3 (4, 25.4882) -> (4, 39.5)
  line L4 (4, 39.5) -> (0, 39.5)
  line L5 (0, 39.5) -> (0, 25.4882)
  point P0 (-9.5, 60)
extrude "Extrusion52" add sketch "Sketch68" along normal blind 20
sketch "Sketch69" plane through (44, -18.5, -1) normal (1, 0, 0) x (0, 0, -1)
  line L0 (-2, 4) -> (0, 4) projected
  line L1 (0, 0) -> (0, 4) projected
  line L2 (-2, 4) -> (0, 4)
  line L3 (0, 4) -> (0, 0)
  line L4 (0, 0) -> (-2, 0)
  line L5 (-2, 0) -> (-2, 4)
  point P0 (-1, 18.5)
extrude "Extrusion53" cut sketch "Sketch69" against normal blind 20
sketch "Sketch70" plane through (44, -20.5, 1) normal (-1, 0, 0) x (0, 0, 1)
  line L0 (0, 2) -> (-2, 2) projected
  line L1 (0, 2) -> (2, 2)
  line L2 (2, 2) -> (2, 0)
  line L3 (2, 0) -> (0, 0)
  line L4 (0, 0) -> (0, 2)
  point P0 (-1, 20.5)
extrude "Extrusion54" add sketch "Sketch70" along normal up to surface (15 mm away)
sketch "Sketch71" plane through (31, 0, 0) normal (1, 0, 0) x (0, 0, -1)
  line L0 (1, 0) -> (9.5, 0) projected
  line L1 (33, -20.5) -> (33, -18.5) projected
  line L2 (1, 0) -> (33, 0)
  line L3 (33, 0) -> (33, -18.5)
  line L4 (33, -18.5) -> (1, -18.5)
  line L5 (1, -18.5) -> (1, 0)
  point P0 (0, 0)
extrude "Extrusion55" cut sketch "Sketch71" against normal up to surface (35 mm away)
sketch "Sketch72" plane through (31, 0, 0) normal (1, 0, 0) x (0, 0, -1)
  line L0 (33, -16.5) -> (33, -18.5) projected
  line L1 (63, -20.5) -> (63, -16.5) projected
  line L2 (33, -16.5) -> (63, -16.5)
  line L3 (63, -16.5) -> (63, -18.5)
  line L4 (63, -18.5) -> (33, -18.5)
  line L5 (33, -18.5) -> (33, -16.5)
  point P0 (0, 0)
extrude "Extrusion56" cut sketch "Sketch72" against normal blind 10
sketch "Sketch73" plane through (29, -20.5, -13.5) normal (-1, 0, 0) x (0, 0, 1)
  point P0 (13.5, 20.5)
sketch "Sketch74" plane through (29, -20.5, -13.5) normal (-1, 0, 0) x (0, 0, 1)
  line L0 (16.5, 2) -> (-49.5, 2) projected
  line L1 (4, 0) -> (0, 0) projected
  line L2 (-49.5, 2) -> (0, 2)
  line L3 (0, 2) -> (0, 0)
  line L4 (0, 0) -> (-49.5, 0)
  line L5 (-49.5, 0) -> (-49.5, 2)
  line L6 (16.5, 2) -> (4, 2) projected
  line L7 (4, 0) -> (16.5, 0) projected
  line L8 (4, 2) -> (16.5, 2)
  line L9 (16.5, 2) -> (16.5, 0)
  line L10 (16.5, 0) -> (4, 0)
  line L11 (4, 0) -> (4, 2)
  point P0 (13.5, 20.5)
extrude "Extrusion57" add sketch "Sketch74" along normal blind 20 contours L9 L7 L11 L0 | L3 L4 L5 L0
sketch "Sketch75" plane through (65, -18.5, 3) normal (0, 1, 0) x (1, 0, 0)
  line L0 (-56, 16.5) -> (-56, 66) projected
  line L1 (0, 0) -> (-56, 0) projected
  line L2 (-56, 66) -> (-54, 66)
  line L3 (-54, 66) -> (-54, 0)
  line L4 (-54, 0) -> (-56, 0)
  line L5 (-56, 0) -> (-56, 66)
  point P0 (-65, 3)
  point P1 (-56, 0)
  dimension "d145" = 2
extrude "Extrusion58" add sketch "Sketch75" along normal blind 2
sketch "Sketch76" plane through (82, 0, 0) normal (1, 0, 0) x (0, 0, -1)
  point P0 (0, 0)
sketch "Sketch77" plane through (82, 0, 0) normal (1, 0, 0) x (0, 0, -1)
  line L0 (2.0812, -18.5) -> (2.0812, -20.5) projected
  line L1 (2.0812, -20.5) -> (25.0812, -20.5) projected
  line L2 (2.0812, -18.5) -> (25.0812, -18.5)
  line L3 (25.0812, -18.5) -> (25.0812, -20.5)
  line L4 (25.0812, -20.5) -> (2.0812, -20.5)
  line L5 (2.0812, -20.5) -> (2.0812, -18.5)
  point P0 (0, 0)
extrude "Extrusion59" cut sketch "Sketch77" against normal blind 2
sketch "Sketch78" plane through (65, -16.5, 3) normal (0, 1, 0) x (1, 0, 0)
  line L0 (-56, 12.5) -> (-56, 0) projected
  line L1 (-56, 66) -> (2, 66) projected
  line L2 (-56, 0) -> (-53.9374, 0)
  line L3 (-53.9374, 0) -> (-53.9374, 66)
  line L4 (-53.9374, 66) -> (-56, 66)
  line L5 (-56, 66) -> (-56, 0)
  point P0 (-65, 3)
  point P1 (-56, 12.5)
extrude "Extrusion60" add sketch "Sketch78" along normal blind 3
sketch "Sketch79" plane through (68, -18.5, -2.0812) normal (0, 1, 0) x (1, 0, 0)
  line L0 (14, -5.0812) -> (-1, -5.0812) projected
  line L1 (-1, 30.9188) -> (14, 30.9188) projected
  line L2 (14, -5.0812) -> (-0.0009, -5.0812)
  line L3 (-0.0009, -5.0812) -> (-0.0009, 30.9188)
  line L4 (-0.0009, 30.9188) -> (14, 30.9188)
  line L5 (14, 30.9188) -> (14, -5.0812)
  point P0 (-68, -2.0812)
extrude "Extrusion61" cut sketch "Sketch79" against normal blind 3
sketch "Sketch80" plane through (67.9991, -18.5, 3) normal (1, 0, 0) x (0, 0, -1)
  line L0 (0, 0) -> (0, 2) projected
  line L1 (36, -2) -> (66, -2) projected
  line L2 (0, 0) -> (36, 0)
  line L3 (36, 0) -> (36, -2)
  line L4 (36, -2) -> (0, -2)
  line L5 (0, -2) -> (0, 0)
  point P0 (3, 18.5)
extrude "Extrusion62" add sketch "Sketch80" along normal blind 5
sketch "Sketch81" plane through (67, -18.5, 3) normal (0, 1, 0) x (1, 0, 0)
  point P0 (-67, 3)
sketch "Sketch82" plane through (29, 50, 3) normal (0, 0, 1) x (1, 0, 0)
  line L0 (38, -70.5) -> (43.9991, -70.5) projected
  line L1 (38, -68.5) -> (43.9991, -68.5) projected
  line L2 (43.9991, -70.5) -> (40.9991, -70.5)
  line L3 (40.9991, -70.5) -> (40.9991, -68.5)
  line L4 (40.9991, -68.5) -> (43.9991, -68.5)
  line L5 (43.9991, -68.5) -> (43.9991, -70.5)
  point P0 (-29, -50)
  dimension "d156" = 3
extrude "Extrusion63" add sketch "Sketch82" along normal blind 10
sketch "Sketch83" plane through (72.9991, -18.5, 3) normal (1, 0, 0) x (0, 0, -1)
  line L0 (36, 0) -> (-10, 0) projected
  line L1 (36, -2) -> (-10, -2) projected
  line L2 (-10, 0) -> (-5, 0)
  line L3 (-5, 0) -> (-5, -2)
  line L4 (-5, -2) -> (-10, -2)
  line L5 (-10, -2) -> (-10, 0)
  point P0 (3, 18.5)
  point P1 (-5, 0)
  dimension "d159" = 5
extrude "Extrusion64" add sketch "Sketch83" along normal blind 15.5
sketch "Sketch84" plane through (72.9991, -20.5, 8) normal (0, 0, -1) x (-1, 0, 0)
  line L0 (3, 2) -> (-15.5, 2) projected
  line L1 (0, 0) -> (-15.5, 0) projected
  line L2 (-15.5, 2) -> (-12.5, 2)
  line L3 (-12.5, 2) -> (-12.5, 0)
  line L4 (-12.5, 0) -> (-15.5, 0)
  line L5 (-15.5, 0) -> (-15.5, 2)
  point P0 (72.9991, 20.5)
  point P1 (-12.5, 2)
  dimension "d162" = 3
extrude "Extrusion65" add sketch "Sketch84" along normal blind 26
sketch "Sketch85" plane through (85.4991, -20.5, 8) normal (-1, 0, 0) x (0, 0, 1)
  line L0 (-26, 2) -> (-26, 0) projected
  line L1 (-41, 0) -> (0, 0) projected
  line L2 (-26, 2) -> (-23, 2)
  line L3 (-23, 2) -> (-23, 0)
  line L4 (-23, 0) -> (-26, 0)
  line L5 (-26, 0) -> (-26, 2)
  point P0 (-8, 20.5)
  dimension "d165" = 3
extrude "Extrusion66" add sketch "Sketch85" along normal up to surface (12.5 mm away)
sketch "Sketch86" plane through (72.9991, -20.5, -18) normal (0, 0, -1) x (-1, 0, 0)
  line L0 (-15.5, 2) -> (-15.5, 0) projected
  line L1 (63.9991, 0) -> (5.9991, 0) projected
  line L2 (-15.5, 2) -> (5.9991, 2)
  line L3 (5.9991, 2) -> (5.9991, 0)
  line L4 (5.9991, 0) -> (-15.5, 0)
  line L5 (-15.5, 0) -> (-15.5, 2)
  point P0 (72.9991, 20.5)
extrude "Extrusion67" add sketch "Sketch86" along normal blind 10
sketch "Sketch87" plane through (67, -18.5, 3) normal (0, 1, 0) x (1, 0, 0)
  line L0 (5.9991, -5) -> (18.4991, -5) projected
  line L1 (18.4991, 18) -> (5.9991, 18) projected
  circle A0 centre (12.2491, -7) radius 1
  circle A1 centre (12.2491, 20) radius 1
  point P0 (-67, 3)
  point P1 (12.2491, -5)
  point P2 (12.2491, 18)
  dimension "d170" = 2
  dimension "d171" = 2
extrude "Extrusion68" cut sketch "Sketch87" against normal blind 10
thread "Thread3" size "M2x0.4" class "6H" standard "ANSI Metric M Profile" full length
thread "Thread4" size "M2x0.4" class "6H" standard "ANSI Metric M Profile" full length
sketch "Sketch88" plane through (2, 0, -33) normal (0, 0, -1) x (-1, 0, 0)
  line L0 (-70.9991, -18.5) -> (-70.9991, -20.5) projected
  line L1 (-65, -20.5) -> (-70.9991, -20.5) projected
  line L2 (-70.9991, -18.5) -> (-65, -18.5)
  line L3 (-65, -18.5) -> (-65, -20.5)
  line L4 (-65, -20.5) -> (-70.9991, -20.5)
  line L5 (-70.9991, -20.5) -> (-70.9991, -18.5)
  point P0 (2, 0)
extrude "Extrusion69" cut sketch "Sketch88" against normal up to surface (5 mm away)
properties part number "btholder"
